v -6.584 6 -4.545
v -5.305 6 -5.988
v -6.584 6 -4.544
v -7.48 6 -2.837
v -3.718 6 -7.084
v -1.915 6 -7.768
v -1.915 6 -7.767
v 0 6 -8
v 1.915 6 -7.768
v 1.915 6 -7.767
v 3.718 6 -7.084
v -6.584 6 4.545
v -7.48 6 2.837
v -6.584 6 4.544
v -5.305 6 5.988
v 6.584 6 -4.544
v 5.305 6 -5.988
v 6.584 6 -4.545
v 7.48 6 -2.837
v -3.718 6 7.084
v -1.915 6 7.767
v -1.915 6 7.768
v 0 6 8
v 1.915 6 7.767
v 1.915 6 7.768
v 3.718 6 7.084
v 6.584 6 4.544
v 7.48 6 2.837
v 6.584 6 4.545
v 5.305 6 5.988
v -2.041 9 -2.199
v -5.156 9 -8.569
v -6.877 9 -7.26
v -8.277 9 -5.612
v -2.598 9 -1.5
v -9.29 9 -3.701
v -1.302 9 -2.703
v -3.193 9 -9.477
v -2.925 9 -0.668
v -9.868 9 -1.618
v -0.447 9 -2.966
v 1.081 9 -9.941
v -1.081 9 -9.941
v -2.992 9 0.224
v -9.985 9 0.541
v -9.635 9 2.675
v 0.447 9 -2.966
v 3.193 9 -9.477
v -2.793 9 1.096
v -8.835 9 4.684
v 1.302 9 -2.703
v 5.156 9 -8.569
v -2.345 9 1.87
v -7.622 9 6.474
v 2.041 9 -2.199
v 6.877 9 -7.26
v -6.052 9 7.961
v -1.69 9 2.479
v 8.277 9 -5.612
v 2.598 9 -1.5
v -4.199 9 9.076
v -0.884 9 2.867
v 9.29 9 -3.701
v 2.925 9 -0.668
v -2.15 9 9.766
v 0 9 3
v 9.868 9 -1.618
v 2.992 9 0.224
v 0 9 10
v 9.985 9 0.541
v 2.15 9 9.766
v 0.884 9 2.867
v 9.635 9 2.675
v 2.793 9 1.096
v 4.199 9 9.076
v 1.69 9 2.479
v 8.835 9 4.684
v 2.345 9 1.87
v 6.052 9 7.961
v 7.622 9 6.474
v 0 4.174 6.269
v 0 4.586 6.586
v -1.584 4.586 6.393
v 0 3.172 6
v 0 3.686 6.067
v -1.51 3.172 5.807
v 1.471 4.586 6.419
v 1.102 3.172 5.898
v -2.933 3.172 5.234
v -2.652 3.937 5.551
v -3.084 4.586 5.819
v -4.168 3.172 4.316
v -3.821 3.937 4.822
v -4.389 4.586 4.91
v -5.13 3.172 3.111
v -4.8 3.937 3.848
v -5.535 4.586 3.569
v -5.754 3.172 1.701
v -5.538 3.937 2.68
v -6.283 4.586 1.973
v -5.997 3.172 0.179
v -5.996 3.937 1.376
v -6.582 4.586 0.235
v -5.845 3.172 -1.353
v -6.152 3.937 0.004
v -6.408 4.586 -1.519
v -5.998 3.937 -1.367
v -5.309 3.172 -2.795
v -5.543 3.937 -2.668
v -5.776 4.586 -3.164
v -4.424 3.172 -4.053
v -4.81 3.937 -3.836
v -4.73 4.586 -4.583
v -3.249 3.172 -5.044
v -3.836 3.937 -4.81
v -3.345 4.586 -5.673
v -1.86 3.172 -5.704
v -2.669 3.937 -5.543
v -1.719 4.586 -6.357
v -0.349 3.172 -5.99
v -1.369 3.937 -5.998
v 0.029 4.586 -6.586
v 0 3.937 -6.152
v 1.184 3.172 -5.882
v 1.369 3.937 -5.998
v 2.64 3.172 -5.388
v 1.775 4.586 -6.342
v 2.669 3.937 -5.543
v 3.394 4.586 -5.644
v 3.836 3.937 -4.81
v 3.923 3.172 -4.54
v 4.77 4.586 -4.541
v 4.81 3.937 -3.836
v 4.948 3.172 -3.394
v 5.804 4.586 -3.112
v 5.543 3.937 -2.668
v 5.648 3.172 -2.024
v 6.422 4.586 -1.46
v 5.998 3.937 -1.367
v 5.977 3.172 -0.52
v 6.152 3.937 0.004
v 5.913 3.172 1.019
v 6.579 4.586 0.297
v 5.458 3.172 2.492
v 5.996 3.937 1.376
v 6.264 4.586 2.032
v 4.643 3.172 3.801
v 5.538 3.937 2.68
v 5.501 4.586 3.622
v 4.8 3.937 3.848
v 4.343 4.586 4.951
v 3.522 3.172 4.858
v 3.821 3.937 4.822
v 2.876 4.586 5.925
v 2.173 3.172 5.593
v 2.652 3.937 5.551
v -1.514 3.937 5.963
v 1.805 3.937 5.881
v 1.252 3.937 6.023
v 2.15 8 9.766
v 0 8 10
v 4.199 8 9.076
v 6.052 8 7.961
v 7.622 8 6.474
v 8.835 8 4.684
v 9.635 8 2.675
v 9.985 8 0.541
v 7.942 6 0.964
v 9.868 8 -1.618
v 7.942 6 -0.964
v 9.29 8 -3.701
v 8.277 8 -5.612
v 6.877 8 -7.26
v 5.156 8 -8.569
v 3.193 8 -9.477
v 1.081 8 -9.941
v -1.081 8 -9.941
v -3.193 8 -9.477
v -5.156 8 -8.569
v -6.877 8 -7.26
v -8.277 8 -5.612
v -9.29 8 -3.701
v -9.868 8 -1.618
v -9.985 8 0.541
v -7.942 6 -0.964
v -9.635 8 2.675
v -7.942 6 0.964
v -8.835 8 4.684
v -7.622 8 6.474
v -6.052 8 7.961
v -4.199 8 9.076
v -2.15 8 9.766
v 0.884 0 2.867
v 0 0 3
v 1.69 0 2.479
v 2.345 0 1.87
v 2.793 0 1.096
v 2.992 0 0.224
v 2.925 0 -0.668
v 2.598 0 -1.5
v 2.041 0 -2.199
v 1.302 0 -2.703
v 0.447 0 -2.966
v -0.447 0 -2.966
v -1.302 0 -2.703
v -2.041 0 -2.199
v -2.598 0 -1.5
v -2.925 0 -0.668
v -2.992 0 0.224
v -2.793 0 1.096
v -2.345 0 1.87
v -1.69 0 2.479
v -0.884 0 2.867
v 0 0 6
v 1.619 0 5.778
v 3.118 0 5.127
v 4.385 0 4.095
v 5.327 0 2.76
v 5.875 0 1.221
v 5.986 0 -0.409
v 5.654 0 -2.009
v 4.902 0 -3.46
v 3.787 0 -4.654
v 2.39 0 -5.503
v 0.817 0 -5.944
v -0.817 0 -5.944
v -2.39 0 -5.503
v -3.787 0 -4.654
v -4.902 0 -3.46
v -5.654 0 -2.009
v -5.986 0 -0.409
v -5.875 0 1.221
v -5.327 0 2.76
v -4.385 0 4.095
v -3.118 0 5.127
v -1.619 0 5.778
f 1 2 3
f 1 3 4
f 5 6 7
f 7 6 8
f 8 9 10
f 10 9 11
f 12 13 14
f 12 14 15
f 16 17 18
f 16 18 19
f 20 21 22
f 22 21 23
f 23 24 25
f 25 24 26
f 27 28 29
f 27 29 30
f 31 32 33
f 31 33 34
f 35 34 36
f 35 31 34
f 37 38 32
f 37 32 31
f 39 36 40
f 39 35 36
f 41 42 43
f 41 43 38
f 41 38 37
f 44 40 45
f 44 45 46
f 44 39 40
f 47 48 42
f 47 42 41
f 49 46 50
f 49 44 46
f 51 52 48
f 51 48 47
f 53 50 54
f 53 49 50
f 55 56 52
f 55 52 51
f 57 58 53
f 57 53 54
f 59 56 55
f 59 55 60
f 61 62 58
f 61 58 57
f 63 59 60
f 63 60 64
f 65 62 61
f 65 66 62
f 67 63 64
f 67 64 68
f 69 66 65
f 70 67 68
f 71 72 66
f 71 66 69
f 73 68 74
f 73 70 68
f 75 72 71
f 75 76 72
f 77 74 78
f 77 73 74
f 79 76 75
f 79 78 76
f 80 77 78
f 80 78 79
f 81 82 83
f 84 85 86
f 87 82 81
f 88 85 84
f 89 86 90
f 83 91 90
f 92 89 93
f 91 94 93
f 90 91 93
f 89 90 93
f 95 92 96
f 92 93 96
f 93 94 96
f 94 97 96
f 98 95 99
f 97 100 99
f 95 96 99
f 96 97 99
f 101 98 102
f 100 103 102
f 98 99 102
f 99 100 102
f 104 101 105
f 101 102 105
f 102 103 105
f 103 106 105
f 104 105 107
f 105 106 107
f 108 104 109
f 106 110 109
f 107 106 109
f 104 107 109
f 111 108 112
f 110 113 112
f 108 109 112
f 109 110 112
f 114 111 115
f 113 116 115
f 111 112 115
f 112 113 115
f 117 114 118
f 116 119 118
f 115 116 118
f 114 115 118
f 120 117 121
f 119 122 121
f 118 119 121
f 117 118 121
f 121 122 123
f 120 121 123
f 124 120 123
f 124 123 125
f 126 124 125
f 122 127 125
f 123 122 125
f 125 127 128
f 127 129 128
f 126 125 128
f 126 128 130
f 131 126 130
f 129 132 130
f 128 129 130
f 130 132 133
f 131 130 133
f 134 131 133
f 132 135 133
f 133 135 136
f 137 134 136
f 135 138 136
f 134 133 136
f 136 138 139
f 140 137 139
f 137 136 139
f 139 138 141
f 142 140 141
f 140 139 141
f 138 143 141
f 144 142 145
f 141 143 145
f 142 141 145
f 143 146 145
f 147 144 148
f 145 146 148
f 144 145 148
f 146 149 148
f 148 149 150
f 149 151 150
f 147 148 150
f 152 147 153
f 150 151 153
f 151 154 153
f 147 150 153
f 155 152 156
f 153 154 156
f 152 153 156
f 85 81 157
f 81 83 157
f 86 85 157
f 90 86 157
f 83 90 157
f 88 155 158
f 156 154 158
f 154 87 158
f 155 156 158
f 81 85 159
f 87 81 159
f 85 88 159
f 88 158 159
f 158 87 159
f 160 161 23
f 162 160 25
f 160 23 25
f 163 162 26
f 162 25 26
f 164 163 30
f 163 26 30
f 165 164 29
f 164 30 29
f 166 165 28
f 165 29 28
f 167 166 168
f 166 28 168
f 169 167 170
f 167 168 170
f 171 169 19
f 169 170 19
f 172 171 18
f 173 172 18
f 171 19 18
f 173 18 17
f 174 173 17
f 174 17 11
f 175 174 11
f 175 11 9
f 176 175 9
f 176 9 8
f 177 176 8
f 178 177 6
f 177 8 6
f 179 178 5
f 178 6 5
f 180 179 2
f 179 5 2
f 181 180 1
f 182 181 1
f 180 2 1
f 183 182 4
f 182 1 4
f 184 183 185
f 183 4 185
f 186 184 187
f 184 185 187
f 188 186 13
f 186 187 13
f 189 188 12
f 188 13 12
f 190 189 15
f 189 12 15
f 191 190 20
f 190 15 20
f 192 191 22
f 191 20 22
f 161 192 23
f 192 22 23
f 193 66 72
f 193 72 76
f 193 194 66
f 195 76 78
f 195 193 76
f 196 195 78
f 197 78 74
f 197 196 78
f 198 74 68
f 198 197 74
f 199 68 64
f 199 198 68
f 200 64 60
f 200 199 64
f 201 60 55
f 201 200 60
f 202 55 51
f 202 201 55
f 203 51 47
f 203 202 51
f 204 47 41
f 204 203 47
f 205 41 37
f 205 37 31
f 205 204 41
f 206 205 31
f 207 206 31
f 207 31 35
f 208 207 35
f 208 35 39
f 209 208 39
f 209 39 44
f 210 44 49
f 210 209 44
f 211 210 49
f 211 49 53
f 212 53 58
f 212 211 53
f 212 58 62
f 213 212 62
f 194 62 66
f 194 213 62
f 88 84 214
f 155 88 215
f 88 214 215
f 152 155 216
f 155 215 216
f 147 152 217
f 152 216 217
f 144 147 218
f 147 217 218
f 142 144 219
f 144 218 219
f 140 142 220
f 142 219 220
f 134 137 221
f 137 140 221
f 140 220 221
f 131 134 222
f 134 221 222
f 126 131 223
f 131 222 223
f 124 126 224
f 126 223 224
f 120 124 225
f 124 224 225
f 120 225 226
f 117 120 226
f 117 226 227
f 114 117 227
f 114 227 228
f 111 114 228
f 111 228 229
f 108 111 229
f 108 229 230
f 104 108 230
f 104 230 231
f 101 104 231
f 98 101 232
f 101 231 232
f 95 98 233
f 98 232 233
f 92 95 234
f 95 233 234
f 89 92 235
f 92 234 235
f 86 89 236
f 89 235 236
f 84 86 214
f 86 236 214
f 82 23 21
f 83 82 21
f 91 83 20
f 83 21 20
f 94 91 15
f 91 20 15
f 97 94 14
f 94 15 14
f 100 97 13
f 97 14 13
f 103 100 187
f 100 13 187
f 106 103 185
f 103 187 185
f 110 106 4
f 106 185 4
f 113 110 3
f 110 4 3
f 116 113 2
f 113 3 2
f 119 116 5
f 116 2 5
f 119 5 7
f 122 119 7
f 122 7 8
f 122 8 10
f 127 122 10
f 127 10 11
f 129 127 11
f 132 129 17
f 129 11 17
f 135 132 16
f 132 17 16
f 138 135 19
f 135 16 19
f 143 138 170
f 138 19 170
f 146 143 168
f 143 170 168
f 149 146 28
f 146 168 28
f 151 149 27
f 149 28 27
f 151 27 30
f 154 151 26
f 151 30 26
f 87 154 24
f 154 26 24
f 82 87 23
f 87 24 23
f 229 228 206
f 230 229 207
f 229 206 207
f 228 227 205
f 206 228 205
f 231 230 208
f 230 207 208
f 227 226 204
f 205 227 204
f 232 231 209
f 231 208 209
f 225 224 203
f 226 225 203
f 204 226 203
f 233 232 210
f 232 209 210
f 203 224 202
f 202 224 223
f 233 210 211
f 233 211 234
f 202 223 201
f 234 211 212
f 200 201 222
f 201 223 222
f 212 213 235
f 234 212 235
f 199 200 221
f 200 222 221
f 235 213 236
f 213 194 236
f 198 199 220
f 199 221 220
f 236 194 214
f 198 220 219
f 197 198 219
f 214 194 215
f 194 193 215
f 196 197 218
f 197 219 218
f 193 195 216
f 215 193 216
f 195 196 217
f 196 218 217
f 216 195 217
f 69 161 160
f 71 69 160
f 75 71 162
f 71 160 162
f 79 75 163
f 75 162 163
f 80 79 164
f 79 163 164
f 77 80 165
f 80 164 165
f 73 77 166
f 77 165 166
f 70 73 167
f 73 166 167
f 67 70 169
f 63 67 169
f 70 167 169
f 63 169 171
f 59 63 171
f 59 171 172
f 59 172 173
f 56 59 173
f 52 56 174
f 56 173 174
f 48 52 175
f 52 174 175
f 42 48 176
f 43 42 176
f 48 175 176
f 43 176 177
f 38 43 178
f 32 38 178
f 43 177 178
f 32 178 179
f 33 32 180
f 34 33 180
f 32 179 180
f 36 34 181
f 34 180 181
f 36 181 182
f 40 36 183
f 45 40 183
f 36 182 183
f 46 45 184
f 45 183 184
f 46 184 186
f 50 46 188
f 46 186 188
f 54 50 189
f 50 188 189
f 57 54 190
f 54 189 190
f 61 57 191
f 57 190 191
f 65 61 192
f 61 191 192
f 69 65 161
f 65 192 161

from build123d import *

# Parameters (mm, degrees)
SKETCH1_R           = 6
SKETCH1_R_2         = 3
BOSS_EXTRUDE1_DEPTH = 9
BOSS_EXTRUDE2_START = -3
SKETCH2_R           = 10
SKETCH2_R_2         = 3
BOSS_EXTRUDE2_DEPTH = 3
CHAMFER1_SIZE       = 2
FILLET1_R           = 2


with BuildPart() as part:
    # Sketch1 → Boss-Extrude1 (new body)
    with BuildSketch(Plane(origin=(0, 0, 0), x_dir=(1, 0, 0), z_dir=(0, 1, 0))):
        with Locations(Location((0, 0, 0), (0, 0, 270))):
            Circle(SKETCH1_R)
        with Locations(Location((0, 0, 0), (0, 0, 270))):
            Circle(SKETCH1_R_2, mode=Mode.SUBTRACT)
    extrude(amount=BOSS_EXTRUDE1_DEPTH)

    # Sketch2 → Boss-Extrude2 (add)
    with BuildSketch(Plane(origin=(0, 9, 0), x_dir=(1, 0, 0), z_dir=(0, 1, 0)).offset(BOSS_EXTRUDE2_START)):
        with Locations(Location((0, 0, 0), (0, 0, 270))):
            Circle(SKETCH2_R)
        with Locations(Location((0, 0, 0), (0, 0, 270))):
            Circle(SKETCH2_R_2, mode=Mode.SUBTRACT)
    extrude(amount=BOSS_EXTRUDE2_DEPTH)

    # Chamfer1
    chamfer1_edges = [part.edges().sort_by_distance(p)[0] for p in [
        (0, 6, -6),
        (0, 6, -10),
    ]]
    chamfer(chamfer1_edges, length=CHAMFER1_SIZE - 0.0001)  # a hair under: the kernel refuses the full size

    # Fillet1
    fillet1_edges = [part.edges().sort_by_distance(p)[0] for p in [
        (0, 4.0001, -6),
    ]]
    fillet(fillet1_edges, radius=FILLET1_R)


solid = part.part
